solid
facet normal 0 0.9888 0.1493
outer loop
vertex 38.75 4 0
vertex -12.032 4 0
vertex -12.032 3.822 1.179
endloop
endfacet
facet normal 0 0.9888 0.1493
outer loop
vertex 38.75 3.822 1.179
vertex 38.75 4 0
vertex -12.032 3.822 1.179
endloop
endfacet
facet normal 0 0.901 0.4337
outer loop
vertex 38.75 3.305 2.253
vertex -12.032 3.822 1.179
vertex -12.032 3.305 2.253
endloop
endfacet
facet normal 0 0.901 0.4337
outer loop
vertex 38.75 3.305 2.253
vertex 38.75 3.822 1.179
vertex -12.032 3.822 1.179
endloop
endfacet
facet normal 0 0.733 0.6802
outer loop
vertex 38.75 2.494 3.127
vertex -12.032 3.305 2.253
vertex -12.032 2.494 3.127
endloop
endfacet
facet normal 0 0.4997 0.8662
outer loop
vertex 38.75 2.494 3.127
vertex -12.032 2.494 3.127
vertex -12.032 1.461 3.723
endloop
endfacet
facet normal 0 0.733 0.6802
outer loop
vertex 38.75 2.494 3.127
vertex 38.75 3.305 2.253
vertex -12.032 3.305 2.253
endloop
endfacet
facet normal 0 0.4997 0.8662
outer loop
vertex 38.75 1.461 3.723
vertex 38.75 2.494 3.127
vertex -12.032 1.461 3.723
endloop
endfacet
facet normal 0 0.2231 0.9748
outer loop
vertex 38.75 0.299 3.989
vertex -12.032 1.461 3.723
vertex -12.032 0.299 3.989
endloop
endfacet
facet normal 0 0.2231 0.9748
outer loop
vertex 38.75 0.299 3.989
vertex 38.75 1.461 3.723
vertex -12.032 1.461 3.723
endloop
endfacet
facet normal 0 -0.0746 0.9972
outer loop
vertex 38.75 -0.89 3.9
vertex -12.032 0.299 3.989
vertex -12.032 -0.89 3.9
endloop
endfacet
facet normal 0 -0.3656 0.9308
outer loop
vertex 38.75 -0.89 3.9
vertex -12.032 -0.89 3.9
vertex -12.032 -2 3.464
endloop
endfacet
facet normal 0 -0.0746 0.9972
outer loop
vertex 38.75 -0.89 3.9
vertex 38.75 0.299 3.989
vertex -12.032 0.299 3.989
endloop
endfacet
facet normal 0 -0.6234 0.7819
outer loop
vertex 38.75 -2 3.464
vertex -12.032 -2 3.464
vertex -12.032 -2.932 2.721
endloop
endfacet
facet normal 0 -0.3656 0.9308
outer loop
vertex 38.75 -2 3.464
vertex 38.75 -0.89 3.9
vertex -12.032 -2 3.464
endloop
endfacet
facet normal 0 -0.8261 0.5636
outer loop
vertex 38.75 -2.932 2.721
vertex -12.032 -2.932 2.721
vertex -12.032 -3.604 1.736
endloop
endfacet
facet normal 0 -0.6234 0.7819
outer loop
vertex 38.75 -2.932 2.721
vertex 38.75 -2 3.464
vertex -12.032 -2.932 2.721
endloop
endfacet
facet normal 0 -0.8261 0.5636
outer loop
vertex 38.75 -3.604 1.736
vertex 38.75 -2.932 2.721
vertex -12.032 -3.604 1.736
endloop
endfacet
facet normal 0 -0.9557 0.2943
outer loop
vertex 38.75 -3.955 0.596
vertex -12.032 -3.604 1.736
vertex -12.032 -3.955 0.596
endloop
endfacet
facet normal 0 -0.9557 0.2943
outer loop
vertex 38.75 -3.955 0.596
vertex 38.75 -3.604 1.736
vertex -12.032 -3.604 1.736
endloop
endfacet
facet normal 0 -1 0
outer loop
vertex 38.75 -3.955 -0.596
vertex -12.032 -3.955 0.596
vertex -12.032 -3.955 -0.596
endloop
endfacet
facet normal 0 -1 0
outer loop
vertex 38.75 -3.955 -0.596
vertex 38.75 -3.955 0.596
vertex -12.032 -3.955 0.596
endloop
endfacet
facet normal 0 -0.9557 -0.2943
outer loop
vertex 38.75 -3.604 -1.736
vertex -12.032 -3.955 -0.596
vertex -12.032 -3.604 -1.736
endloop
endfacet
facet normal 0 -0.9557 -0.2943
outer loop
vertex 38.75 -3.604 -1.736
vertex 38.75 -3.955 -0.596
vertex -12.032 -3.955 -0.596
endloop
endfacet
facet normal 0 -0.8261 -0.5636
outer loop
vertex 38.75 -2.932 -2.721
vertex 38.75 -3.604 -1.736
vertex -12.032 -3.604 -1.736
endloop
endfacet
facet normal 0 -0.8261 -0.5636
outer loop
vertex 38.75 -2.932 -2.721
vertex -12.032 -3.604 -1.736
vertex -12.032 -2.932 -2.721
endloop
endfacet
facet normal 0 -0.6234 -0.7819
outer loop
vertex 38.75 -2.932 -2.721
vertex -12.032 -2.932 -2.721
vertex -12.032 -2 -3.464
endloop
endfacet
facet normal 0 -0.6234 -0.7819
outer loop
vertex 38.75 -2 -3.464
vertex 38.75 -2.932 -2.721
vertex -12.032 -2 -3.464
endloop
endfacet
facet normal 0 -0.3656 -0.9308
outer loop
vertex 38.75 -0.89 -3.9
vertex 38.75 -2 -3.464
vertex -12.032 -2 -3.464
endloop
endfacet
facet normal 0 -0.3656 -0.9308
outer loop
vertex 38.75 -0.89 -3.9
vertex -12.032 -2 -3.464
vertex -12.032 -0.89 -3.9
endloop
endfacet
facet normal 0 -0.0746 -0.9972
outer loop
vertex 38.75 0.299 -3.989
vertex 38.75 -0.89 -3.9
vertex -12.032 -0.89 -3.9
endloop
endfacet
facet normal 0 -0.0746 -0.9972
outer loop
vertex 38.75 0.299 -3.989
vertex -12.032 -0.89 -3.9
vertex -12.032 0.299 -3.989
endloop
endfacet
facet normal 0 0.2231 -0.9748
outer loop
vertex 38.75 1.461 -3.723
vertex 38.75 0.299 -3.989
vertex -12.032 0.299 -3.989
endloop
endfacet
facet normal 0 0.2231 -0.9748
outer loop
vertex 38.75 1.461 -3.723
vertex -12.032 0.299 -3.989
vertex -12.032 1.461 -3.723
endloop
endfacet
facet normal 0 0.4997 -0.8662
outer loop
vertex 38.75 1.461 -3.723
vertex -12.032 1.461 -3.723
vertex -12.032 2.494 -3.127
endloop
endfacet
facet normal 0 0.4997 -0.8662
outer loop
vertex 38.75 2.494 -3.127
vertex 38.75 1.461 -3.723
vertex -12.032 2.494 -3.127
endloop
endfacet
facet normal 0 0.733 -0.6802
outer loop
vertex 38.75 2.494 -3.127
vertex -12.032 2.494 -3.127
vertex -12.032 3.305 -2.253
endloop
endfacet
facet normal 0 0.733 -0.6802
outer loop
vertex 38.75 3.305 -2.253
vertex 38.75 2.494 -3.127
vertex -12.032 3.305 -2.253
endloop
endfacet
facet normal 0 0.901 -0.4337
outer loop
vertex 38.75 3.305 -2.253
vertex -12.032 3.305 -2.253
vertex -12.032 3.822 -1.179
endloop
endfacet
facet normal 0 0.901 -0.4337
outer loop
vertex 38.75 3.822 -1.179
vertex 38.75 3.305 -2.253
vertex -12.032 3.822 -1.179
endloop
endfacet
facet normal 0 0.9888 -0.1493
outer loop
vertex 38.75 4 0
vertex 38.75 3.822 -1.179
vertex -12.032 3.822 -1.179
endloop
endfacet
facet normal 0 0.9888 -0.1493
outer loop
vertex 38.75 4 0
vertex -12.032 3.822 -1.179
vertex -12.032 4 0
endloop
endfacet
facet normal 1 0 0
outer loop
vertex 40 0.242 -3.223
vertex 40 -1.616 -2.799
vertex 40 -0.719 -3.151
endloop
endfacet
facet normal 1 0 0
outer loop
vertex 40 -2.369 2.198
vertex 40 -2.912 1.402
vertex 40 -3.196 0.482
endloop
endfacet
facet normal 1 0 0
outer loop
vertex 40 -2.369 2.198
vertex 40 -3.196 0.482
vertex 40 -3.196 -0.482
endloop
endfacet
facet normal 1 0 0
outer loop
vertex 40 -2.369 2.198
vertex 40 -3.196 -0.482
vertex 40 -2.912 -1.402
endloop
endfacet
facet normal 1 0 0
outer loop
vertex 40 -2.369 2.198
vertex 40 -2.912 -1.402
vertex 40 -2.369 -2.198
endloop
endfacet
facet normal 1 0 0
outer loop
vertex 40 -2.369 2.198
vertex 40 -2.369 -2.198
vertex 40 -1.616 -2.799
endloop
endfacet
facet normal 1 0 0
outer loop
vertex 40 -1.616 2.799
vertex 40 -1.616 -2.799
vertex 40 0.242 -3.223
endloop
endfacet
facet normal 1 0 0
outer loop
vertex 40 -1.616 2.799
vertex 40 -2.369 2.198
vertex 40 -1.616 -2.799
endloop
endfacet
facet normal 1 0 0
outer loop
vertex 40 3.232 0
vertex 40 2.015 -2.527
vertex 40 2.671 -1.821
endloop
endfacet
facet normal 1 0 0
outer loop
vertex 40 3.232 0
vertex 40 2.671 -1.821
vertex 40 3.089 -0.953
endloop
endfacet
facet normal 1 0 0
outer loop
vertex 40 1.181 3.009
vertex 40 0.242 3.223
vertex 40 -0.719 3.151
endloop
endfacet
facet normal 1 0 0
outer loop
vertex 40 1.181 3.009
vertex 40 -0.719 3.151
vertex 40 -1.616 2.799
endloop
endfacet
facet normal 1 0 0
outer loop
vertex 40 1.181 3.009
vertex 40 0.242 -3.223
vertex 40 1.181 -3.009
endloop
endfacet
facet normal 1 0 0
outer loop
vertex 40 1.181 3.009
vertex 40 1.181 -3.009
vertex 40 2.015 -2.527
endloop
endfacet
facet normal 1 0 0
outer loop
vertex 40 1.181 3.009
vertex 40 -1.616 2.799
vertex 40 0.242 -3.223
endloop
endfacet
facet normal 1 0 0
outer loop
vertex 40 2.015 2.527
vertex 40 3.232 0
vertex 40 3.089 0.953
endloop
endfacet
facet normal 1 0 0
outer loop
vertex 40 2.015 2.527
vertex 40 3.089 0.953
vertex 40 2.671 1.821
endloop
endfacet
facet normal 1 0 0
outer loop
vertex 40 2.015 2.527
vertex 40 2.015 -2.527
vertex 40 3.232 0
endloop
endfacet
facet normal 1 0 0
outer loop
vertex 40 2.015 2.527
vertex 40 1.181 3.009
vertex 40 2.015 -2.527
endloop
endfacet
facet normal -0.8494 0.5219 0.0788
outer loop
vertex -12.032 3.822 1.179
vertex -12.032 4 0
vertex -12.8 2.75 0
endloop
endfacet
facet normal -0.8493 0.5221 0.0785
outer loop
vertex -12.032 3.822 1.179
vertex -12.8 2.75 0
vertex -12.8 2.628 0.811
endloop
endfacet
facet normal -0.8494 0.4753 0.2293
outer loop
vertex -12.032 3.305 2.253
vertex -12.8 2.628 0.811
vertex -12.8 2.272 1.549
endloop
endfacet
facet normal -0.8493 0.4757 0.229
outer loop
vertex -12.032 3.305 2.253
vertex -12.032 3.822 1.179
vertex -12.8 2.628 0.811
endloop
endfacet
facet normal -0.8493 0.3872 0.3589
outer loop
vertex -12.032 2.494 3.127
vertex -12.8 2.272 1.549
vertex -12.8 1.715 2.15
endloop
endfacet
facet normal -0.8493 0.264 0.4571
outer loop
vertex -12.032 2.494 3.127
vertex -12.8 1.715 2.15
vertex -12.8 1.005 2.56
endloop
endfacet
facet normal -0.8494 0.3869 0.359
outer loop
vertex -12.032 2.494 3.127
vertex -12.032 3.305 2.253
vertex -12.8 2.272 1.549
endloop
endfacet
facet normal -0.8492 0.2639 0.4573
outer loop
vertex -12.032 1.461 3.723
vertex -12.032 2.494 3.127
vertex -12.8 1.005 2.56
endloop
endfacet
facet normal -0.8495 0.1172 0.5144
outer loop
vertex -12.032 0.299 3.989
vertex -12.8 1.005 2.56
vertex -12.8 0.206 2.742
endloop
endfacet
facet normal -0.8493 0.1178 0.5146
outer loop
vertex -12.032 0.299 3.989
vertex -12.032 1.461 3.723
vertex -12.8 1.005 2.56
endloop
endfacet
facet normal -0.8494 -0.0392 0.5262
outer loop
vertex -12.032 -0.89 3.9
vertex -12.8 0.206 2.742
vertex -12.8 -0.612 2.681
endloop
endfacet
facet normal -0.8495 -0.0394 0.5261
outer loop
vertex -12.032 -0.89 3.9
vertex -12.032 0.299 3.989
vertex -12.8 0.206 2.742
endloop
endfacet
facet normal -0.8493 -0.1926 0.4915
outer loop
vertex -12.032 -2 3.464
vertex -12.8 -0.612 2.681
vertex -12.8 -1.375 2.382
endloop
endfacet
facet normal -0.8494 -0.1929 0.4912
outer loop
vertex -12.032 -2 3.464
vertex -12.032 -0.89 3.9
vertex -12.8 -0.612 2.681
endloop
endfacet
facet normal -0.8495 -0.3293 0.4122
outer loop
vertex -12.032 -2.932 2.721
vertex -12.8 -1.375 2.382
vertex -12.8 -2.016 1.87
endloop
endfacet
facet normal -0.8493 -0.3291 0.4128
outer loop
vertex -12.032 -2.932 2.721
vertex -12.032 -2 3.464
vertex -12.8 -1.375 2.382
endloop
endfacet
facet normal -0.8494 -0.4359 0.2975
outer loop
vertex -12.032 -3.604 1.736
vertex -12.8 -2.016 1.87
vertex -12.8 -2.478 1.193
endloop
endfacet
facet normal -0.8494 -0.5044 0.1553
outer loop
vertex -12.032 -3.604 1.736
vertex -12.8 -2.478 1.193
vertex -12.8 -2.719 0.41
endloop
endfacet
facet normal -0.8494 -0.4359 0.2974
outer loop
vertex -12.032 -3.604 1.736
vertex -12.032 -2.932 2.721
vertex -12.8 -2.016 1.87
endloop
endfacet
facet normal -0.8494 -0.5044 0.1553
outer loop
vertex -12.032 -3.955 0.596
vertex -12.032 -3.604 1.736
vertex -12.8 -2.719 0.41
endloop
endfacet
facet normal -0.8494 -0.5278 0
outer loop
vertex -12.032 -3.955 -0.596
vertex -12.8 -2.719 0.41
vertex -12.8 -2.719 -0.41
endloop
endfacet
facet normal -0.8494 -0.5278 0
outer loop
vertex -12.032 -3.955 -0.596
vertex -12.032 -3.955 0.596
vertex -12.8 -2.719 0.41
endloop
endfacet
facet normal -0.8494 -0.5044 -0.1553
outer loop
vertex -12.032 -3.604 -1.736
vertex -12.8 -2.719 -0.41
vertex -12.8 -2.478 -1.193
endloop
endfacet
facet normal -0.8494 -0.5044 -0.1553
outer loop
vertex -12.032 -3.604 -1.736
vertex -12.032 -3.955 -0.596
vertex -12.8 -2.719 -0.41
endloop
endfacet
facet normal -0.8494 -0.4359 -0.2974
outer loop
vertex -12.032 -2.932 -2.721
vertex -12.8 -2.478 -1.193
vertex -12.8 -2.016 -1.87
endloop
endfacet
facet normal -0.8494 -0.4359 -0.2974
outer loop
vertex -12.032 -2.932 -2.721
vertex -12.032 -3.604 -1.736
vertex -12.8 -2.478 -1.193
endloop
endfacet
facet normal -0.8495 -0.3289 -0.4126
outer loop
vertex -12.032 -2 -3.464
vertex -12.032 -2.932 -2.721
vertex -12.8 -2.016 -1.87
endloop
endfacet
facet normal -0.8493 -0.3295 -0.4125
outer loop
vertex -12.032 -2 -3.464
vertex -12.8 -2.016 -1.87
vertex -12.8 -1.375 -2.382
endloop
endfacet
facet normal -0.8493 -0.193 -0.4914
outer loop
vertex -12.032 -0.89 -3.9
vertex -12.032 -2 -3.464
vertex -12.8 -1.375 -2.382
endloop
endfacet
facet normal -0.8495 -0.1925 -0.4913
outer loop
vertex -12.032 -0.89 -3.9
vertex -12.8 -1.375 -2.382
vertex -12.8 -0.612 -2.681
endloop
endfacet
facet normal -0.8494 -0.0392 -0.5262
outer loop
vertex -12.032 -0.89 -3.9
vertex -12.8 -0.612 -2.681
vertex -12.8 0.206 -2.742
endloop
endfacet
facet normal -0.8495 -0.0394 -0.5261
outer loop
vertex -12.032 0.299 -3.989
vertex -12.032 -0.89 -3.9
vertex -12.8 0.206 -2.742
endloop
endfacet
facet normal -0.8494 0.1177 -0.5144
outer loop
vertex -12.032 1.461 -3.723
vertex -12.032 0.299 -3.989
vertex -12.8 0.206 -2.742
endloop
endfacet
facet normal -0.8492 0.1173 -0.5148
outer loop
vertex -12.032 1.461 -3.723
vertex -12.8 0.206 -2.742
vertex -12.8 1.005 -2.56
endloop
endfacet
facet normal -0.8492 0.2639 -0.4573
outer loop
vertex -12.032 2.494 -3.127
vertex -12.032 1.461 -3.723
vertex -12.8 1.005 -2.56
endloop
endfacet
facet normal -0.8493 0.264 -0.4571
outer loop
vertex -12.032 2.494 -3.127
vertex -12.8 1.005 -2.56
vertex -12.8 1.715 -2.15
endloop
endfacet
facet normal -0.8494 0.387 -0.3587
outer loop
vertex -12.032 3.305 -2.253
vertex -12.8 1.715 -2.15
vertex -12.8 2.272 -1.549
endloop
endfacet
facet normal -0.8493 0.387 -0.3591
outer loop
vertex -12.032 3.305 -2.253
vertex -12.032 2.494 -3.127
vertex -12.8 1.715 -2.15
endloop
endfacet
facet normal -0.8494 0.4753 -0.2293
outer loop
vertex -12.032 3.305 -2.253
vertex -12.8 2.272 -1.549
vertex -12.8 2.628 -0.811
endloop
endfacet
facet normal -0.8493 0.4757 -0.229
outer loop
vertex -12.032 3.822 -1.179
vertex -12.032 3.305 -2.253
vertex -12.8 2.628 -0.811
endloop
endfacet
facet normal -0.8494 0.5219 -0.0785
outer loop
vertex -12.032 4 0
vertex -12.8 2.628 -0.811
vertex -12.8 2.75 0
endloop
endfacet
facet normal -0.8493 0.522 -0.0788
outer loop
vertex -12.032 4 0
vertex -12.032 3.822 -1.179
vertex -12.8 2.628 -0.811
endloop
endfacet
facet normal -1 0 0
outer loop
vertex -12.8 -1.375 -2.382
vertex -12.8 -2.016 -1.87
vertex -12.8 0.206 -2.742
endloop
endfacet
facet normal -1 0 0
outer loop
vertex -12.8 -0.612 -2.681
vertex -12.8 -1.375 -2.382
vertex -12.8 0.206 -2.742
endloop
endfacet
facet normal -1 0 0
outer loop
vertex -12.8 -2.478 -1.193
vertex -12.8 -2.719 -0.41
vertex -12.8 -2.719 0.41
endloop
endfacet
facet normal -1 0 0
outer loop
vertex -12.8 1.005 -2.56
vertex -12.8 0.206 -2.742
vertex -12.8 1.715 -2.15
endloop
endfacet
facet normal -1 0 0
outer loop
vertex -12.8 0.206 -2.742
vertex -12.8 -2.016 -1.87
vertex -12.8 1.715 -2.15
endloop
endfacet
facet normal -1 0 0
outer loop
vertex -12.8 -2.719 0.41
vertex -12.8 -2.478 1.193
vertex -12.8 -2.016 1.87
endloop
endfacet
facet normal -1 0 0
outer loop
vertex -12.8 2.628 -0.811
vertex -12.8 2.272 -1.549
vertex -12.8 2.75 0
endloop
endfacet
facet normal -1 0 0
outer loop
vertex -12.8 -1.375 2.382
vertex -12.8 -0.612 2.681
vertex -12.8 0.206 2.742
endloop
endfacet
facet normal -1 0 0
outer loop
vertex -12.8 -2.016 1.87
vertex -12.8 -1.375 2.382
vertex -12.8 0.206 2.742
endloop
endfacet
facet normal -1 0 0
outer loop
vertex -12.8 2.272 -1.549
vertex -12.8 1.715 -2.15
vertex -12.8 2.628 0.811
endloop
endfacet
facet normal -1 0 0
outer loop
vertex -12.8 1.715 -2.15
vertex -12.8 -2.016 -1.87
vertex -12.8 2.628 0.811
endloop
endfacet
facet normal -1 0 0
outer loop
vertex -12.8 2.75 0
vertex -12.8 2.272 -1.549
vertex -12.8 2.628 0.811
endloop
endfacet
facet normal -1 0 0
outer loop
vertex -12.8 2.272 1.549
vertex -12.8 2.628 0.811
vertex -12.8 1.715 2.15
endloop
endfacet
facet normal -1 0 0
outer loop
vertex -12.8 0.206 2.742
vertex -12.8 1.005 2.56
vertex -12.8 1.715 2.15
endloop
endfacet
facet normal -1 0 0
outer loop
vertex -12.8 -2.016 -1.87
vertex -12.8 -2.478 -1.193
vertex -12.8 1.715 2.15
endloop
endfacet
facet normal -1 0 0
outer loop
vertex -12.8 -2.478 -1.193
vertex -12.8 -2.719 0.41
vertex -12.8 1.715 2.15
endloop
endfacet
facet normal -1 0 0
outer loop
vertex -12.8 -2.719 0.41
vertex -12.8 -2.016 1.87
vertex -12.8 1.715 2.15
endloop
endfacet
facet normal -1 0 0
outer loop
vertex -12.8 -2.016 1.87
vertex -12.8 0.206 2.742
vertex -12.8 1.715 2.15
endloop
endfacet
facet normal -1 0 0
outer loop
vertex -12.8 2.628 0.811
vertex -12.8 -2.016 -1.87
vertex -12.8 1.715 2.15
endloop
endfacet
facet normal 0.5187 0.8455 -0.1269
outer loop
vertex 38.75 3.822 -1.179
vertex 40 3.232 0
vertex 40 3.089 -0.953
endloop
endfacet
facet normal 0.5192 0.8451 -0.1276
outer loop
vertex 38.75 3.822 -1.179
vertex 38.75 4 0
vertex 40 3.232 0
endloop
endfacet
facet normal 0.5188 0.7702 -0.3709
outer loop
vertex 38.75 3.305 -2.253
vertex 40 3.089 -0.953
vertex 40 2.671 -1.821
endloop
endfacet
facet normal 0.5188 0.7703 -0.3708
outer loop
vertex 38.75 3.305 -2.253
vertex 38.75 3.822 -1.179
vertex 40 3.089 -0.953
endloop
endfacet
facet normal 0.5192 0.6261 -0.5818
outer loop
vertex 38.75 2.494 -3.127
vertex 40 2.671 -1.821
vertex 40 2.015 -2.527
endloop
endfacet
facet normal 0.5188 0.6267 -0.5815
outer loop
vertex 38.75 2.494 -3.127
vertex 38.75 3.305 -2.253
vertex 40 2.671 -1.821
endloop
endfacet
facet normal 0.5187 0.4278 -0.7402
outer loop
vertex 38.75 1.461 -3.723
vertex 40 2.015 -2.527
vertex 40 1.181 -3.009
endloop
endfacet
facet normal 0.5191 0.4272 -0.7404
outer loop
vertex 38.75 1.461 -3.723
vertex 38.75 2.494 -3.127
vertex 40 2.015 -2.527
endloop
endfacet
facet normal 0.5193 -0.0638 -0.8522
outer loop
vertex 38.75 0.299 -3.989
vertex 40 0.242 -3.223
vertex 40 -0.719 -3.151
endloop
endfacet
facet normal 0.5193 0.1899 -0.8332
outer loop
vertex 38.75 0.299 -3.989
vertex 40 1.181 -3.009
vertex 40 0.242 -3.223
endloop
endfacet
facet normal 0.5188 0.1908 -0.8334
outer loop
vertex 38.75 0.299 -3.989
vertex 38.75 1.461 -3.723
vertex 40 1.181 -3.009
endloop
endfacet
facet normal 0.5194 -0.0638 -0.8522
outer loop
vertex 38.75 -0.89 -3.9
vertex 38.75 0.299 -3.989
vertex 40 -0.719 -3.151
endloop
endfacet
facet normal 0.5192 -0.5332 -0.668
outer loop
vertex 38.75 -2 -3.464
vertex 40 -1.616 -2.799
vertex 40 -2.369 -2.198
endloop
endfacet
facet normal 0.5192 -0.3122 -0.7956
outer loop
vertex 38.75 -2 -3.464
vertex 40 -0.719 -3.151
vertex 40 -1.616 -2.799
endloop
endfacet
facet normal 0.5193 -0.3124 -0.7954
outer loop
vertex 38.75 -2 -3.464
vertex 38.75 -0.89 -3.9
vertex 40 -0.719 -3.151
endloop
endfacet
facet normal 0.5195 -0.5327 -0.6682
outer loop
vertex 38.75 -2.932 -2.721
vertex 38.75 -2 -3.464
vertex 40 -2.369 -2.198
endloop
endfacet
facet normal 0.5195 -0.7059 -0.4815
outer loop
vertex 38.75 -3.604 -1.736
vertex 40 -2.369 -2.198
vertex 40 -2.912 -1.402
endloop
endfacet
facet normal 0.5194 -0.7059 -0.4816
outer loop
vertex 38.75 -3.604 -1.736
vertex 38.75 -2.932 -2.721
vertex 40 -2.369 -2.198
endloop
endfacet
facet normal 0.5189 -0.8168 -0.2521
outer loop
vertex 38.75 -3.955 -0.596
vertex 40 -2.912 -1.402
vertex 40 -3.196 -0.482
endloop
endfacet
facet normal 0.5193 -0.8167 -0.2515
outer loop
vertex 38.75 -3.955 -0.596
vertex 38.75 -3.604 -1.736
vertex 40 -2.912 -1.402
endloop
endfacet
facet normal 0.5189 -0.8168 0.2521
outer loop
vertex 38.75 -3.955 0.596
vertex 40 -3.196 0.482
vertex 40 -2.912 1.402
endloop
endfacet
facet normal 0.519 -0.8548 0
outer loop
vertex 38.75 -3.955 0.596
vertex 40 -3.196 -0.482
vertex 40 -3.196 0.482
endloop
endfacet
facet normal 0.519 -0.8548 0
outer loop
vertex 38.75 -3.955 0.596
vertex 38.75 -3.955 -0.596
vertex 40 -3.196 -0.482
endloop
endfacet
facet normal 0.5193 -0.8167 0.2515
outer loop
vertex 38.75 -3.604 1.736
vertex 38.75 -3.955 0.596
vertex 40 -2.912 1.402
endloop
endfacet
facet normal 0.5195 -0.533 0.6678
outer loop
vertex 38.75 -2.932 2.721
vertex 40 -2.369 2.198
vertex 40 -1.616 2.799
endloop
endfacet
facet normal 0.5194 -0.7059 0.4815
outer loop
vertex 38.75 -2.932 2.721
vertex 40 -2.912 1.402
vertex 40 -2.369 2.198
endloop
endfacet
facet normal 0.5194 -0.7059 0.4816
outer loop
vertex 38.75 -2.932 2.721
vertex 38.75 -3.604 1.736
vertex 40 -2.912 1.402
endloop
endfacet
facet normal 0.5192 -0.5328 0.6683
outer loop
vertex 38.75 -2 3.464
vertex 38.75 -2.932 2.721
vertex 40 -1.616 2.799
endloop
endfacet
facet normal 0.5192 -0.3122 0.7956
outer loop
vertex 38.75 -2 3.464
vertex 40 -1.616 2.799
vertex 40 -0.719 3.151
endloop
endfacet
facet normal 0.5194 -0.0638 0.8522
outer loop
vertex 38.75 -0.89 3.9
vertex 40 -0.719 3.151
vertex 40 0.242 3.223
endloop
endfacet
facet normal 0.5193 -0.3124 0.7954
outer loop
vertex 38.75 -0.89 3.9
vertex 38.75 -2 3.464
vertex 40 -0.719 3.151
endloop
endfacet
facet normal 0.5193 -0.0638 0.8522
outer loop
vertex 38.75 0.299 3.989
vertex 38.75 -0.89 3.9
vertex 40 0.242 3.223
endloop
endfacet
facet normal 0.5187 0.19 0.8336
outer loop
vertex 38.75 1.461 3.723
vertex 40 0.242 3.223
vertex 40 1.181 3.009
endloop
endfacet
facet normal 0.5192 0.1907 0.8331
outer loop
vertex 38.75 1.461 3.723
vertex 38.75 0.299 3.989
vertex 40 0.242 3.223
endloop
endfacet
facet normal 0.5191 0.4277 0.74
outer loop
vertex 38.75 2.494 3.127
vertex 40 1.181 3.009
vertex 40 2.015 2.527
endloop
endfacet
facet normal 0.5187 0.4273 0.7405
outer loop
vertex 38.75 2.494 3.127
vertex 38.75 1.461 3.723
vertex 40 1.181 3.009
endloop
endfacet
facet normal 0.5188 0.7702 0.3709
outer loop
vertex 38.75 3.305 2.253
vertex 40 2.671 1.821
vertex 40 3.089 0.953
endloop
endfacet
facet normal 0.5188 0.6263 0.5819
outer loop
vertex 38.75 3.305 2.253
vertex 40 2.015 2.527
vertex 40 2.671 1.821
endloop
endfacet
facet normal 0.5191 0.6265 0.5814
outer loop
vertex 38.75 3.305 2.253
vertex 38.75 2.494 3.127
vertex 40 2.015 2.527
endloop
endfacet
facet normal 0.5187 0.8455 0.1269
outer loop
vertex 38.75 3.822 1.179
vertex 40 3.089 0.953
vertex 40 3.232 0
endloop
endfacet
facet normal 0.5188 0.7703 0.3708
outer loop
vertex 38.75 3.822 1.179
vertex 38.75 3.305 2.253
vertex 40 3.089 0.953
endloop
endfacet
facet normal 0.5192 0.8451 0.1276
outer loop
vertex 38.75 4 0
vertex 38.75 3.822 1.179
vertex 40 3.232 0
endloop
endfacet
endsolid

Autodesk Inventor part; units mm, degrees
ref_plane "YZ Plane" through (0, 0, 0) normal (1, 0, 0) x (0, 1, 0)
ref_plane "XZ Plane" through (0, 0, 0) normal (0, 1, 0) x (-1, 0, 0)
sketch "Skizze1" plane through (0, 0, 0) normal (0, 0, 1) x (1, 0, 0)
  line L0 (40, 4) -> (40, 0)
  line L1 (-12.8, 0) -> (40, 0)
  line L2 (-23.36, 0) -> (50.56, 0) projected
  line L3 (0, 4.8) -> (0, -0.8) projected
  line L4 (-12.8, 4) -> (-12.8, 0)
  line L5 (18, 4) -> (18, 0) construction
  line L6 (-23.36, 0) -> (50.56, 0) projected
  line L7 (-12.8, 4) -> (40, 4)
  dimension "d4" = 12.8
  dimension "d5" = 40
  dimension "d6" = 22
  dimension "d13" = 8
revolve "Körper" add sketch "Skizze1" angle 360 about axis through (-12.8, 0, 0) along (1, 0, 0)
thread "Gewinde1" size "M8x1.25" class "6g" standard "ISO Metric profile" length 12.8
thread "Gewinde2" size "M8x1.25" class "6g" standard "ISO Metric profile" length 22.7668
chamfer "Fase1" distance 0.7678 distance2 1.25 1 edges at (40, -4, 0) measured on face at (40, -0.0467, 2.2623)
chamfer "Fase2" distance 0.7678 distance2 1.25 1 edges at (-12.8, -4, 0) measured on face at (21.5667, 3.987, -0.3219)
ref_plane "Work Plane1" through (2.75, 0, 0) normal (0, -1, 0) x (1, 0, 0)
equation "\"d4\" = KOH"
equation "\"d5\" = NLG"
equation "\"d6\" = GEL"
equation "\"d13\" = GD"
equation "\"d1\" = KOH"
equation "\"d7\" = GEL + GAL"
equation "\"d10\" = -0.5 * SPD + 0.5 * GD"
equation "\"d12\" = -0.5 * SPD + 0.5 * GD"
equation "\"NLG\" = 40"
equation "\"GEL\" = 22"
equation "\"GAL\" = 0.61345 * PTC"
equation "\"SPD\" = 5.5"
equation "\"d0\" = GD"
equation "\"GUL\" = 0.61345 * PTC"
equation "\"KOH\" = 12.8"
equation "\"GD\" = 8"
equation "\"BDM\" = NND"
equation "\"GUL1\" = GUL"
equation "\"GAL1\" = GAL"
equation "\"d80\" = -GUL - GEL"
equation "\"d86\" = -KOH + GUL1"
equation "\"PTC\" = 1.25"
equation "\"THREADDIA\" = 8"
equation "\"TOA\" = 30deg"
equation "\"NND\" = 8"
equation "\"GD1\" = THREADDIA - 1.2269 * PTC"
properties part number "DIN 835 - M8 x 40" material "Stahl, weich"
